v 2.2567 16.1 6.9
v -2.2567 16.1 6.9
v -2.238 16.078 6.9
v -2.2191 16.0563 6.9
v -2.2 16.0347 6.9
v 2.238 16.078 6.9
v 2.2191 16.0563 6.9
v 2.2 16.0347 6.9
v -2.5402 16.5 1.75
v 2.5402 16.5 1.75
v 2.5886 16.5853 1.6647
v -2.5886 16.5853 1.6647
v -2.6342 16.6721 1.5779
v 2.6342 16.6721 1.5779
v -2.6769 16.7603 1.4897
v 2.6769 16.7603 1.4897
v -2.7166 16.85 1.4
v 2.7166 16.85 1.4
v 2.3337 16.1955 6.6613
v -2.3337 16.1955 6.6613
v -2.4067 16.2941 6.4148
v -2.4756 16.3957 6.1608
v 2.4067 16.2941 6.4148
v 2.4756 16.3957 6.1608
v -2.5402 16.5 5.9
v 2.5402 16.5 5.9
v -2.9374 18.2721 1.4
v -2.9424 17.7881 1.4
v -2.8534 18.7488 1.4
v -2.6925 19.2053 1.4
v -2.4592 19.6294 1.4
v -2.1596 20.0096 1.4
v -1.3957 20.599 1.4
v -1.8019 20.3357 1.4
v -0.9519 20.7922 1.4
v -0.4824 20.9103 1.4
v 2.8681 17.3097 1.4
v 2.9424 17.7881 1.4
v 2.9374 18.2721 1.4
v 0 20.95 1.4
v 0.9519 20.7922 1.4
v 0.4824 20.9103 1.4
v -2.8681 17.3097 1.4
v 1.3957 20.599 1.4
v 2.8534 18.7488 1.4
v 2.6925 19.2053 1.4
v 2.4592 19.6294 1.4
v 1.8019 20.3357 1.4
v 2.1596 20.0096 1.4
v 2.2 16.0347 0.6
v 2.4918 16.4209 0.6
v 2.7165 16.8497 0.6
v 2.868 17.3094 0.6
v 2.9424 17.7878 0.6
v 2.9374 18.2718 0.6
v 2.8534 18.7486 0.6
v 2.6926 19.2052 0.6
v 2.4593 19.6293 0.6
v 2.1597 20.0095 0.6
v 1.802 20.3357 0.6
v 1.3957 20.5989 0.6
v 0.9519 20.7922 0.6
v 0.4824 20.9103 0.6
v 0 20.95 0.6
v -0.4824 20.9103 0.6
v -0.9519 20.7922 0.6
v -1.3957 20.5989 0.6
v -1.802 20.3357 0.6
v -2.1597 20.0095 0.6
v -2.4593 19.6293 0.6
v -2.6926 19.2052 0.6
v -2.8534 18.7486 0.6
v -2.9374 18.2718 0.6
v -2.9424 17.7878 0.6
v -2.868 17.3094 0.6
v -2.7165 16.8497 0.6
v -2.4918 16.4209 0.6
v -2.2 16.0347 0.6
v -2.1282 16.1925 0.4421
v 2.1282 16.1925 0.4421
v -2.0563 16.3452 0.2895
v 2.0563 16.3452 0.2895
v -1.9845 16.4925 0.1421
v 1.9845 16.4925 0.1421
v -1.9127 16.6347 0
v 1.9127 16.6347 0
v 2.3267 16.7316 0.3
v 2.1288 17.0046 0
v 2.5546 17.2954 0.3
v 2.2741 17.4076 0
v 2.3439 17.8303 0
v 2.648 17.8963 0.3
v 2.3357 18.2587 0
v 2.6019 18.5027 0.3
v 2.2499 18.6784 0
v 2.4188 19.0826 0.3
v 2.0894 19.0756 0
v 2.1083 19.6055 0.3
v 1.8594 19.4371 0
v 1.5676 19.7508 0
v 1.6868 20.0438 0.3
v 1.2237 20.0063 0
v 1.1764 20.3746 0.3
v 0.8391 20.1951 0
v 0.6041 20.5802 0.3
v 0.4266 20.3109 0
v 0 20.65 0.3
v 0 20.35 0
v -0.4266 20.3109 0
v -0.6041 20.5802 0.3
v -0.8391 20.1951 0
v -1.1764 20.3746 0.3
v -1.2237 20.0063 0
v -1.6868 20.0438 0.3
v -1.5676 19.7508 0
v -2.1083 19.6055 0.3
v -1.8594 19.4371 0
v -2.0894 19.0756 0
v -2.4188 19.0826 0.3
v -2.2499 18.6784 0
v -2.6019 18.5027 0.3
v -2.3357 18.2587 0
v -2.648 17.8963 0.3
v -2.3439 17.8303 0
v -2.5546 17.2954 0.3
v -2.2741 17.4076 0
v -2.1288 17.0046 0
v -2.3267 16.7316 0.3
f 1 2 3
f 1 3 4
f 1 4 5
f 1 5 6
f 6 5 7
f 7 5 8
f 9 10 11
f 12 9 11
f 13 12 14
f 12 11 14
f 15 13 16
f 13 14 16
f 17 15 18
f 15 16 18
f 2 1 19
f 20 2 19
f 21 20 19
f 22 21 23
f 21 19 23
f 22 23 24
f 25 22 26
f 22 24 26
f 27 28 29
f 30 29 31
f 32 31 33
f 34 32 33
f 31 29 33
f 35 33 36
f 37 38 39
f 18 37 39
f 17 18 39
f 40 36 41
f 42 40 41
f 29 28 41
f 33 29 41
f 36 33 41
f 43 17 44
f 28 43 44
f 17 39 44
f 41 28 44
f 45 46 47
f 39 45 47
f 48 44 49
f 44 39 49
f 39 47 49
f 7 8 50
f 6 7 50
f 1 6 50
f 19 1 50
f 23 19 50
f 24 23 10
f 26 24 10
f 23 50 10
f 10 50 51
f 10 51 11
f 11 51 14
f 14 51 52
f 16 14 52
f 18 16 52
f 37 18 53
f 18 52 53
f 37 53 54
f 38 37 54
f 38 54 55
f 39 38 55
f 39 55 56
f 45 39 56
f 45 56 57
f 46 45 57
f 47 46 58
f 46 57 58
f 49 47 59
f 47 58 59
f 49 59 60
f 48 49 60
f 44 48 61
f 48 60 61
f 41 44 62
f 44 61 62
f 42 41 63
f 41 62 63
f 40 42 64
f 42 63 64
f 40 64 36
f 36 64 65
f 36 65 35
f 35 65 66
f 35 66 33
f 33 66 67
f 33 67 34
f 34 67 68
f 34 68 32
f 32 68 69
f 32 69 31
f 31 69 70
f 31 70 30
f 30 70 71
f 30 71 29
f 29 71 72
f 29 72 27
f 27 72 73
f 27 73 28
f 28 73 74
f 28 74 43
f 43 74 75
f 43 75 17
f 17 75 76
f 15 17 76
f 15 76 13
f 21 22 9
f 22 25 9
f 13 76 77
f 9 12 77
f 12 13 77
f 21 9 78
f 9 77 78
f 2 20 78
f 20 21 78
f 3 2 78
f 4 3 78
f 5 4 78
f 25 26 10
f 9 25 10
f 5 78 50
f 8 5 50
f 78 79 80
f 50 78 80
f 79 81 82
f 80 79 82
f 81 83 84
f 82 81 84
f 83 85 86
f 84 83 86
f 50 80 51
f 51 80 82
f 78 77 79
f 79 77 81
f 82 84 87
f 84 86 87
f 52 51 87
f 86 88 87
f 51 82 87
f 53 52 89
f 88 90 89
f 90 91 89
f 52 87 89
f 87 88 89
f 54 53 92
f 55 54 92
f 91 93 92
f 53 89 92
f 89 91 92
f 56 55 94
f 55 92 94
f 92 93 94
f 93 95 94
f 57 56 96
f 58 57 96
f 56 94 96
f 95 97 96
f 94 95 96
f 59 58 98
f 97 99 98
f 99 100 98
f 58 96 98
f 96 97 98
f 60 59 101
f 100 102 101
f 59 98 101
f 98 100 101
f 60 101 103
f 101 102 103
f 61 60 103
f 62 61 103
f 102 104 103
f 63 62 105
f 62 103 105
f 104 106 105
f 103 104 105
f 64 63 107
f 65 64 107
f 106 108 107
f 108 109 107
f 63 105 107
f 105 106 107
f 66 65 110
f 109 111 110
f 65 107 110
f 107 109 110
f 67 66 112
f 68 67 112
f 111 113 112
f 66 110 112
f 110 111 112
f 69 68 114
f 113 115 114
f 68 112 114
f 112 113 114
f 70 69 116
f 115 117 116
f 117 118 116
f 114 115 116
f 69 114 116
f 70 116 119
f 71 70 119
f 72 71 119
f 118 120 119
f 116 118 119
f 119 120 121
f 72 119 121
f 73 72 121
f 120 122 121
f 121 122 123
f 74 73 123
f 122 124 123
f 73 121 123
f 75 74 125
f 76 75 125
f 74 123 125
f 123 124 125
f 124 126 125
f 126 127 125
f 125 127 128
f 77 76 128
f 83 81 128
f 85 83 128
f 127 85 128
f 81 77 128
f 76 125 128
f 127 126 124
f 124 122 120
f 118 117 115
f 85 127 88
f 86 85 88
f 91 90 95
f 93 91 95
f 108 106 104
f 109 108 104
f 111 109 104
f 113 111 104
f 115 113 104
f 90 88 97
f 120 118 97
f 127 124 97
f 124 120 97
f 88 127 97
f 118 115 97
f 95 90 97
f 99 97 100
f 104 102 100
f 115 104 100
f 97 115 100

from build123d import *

# Parameters (mm, degrees)
PAD007_DEPTH         = 6.9
POCKET005_DEPTH      = 2.951
POCKET005_DEPTH_BACK = 2.951
CHAMFER008_SIZE      = 0.6


with BuildPart() as part:
    # Sketch018 → Pad007 (new body)
    with BuildSketch(Plane.XY):
        with BuildLine():
            ThreePointArc((2.2, -1.9653244007), (0, 2.95), (-2.2, -1.9653244007))
            Line((-2.2, -1.9653244007), (2.2, -1.9653244007))
        make_face()
    extrude(amount=PAD007_DEPTH)

    # Sketch019 → Pocket005 (cut, two sides)
    with BuildSketch(Plane.YZ) as pocket005_sk:
        Polygon((-1.9, 6.9), (-1.5, 5.9), (-1.5, 1.75), (-1.15, 1.4), (5, 1.4), (5, 6.9), align=None)
    extrude(amount=-POCKET005_DEPTH, mode=Mode.SUBTRACT)
    extrude(pocket005_sk.sketch, amount=POCKET005_DEPTH_BACK, mode=Mode.SUBTRACT)

    # Chamfer008
    chamfer008_edges = [part.edges().sort_by_distance(p)[0] for p in [
        (0, 2.95, 0),
        (0, -1.965324, 0),
    ]]
    chamfer(chamfer008_edges, length=CHAMFER008_SIZE)


with BuildPart() as part_1:
    # Body053 placement: moved
    add(part.part.moved(Location((0, 18, 0))))


solid = part_1.part
